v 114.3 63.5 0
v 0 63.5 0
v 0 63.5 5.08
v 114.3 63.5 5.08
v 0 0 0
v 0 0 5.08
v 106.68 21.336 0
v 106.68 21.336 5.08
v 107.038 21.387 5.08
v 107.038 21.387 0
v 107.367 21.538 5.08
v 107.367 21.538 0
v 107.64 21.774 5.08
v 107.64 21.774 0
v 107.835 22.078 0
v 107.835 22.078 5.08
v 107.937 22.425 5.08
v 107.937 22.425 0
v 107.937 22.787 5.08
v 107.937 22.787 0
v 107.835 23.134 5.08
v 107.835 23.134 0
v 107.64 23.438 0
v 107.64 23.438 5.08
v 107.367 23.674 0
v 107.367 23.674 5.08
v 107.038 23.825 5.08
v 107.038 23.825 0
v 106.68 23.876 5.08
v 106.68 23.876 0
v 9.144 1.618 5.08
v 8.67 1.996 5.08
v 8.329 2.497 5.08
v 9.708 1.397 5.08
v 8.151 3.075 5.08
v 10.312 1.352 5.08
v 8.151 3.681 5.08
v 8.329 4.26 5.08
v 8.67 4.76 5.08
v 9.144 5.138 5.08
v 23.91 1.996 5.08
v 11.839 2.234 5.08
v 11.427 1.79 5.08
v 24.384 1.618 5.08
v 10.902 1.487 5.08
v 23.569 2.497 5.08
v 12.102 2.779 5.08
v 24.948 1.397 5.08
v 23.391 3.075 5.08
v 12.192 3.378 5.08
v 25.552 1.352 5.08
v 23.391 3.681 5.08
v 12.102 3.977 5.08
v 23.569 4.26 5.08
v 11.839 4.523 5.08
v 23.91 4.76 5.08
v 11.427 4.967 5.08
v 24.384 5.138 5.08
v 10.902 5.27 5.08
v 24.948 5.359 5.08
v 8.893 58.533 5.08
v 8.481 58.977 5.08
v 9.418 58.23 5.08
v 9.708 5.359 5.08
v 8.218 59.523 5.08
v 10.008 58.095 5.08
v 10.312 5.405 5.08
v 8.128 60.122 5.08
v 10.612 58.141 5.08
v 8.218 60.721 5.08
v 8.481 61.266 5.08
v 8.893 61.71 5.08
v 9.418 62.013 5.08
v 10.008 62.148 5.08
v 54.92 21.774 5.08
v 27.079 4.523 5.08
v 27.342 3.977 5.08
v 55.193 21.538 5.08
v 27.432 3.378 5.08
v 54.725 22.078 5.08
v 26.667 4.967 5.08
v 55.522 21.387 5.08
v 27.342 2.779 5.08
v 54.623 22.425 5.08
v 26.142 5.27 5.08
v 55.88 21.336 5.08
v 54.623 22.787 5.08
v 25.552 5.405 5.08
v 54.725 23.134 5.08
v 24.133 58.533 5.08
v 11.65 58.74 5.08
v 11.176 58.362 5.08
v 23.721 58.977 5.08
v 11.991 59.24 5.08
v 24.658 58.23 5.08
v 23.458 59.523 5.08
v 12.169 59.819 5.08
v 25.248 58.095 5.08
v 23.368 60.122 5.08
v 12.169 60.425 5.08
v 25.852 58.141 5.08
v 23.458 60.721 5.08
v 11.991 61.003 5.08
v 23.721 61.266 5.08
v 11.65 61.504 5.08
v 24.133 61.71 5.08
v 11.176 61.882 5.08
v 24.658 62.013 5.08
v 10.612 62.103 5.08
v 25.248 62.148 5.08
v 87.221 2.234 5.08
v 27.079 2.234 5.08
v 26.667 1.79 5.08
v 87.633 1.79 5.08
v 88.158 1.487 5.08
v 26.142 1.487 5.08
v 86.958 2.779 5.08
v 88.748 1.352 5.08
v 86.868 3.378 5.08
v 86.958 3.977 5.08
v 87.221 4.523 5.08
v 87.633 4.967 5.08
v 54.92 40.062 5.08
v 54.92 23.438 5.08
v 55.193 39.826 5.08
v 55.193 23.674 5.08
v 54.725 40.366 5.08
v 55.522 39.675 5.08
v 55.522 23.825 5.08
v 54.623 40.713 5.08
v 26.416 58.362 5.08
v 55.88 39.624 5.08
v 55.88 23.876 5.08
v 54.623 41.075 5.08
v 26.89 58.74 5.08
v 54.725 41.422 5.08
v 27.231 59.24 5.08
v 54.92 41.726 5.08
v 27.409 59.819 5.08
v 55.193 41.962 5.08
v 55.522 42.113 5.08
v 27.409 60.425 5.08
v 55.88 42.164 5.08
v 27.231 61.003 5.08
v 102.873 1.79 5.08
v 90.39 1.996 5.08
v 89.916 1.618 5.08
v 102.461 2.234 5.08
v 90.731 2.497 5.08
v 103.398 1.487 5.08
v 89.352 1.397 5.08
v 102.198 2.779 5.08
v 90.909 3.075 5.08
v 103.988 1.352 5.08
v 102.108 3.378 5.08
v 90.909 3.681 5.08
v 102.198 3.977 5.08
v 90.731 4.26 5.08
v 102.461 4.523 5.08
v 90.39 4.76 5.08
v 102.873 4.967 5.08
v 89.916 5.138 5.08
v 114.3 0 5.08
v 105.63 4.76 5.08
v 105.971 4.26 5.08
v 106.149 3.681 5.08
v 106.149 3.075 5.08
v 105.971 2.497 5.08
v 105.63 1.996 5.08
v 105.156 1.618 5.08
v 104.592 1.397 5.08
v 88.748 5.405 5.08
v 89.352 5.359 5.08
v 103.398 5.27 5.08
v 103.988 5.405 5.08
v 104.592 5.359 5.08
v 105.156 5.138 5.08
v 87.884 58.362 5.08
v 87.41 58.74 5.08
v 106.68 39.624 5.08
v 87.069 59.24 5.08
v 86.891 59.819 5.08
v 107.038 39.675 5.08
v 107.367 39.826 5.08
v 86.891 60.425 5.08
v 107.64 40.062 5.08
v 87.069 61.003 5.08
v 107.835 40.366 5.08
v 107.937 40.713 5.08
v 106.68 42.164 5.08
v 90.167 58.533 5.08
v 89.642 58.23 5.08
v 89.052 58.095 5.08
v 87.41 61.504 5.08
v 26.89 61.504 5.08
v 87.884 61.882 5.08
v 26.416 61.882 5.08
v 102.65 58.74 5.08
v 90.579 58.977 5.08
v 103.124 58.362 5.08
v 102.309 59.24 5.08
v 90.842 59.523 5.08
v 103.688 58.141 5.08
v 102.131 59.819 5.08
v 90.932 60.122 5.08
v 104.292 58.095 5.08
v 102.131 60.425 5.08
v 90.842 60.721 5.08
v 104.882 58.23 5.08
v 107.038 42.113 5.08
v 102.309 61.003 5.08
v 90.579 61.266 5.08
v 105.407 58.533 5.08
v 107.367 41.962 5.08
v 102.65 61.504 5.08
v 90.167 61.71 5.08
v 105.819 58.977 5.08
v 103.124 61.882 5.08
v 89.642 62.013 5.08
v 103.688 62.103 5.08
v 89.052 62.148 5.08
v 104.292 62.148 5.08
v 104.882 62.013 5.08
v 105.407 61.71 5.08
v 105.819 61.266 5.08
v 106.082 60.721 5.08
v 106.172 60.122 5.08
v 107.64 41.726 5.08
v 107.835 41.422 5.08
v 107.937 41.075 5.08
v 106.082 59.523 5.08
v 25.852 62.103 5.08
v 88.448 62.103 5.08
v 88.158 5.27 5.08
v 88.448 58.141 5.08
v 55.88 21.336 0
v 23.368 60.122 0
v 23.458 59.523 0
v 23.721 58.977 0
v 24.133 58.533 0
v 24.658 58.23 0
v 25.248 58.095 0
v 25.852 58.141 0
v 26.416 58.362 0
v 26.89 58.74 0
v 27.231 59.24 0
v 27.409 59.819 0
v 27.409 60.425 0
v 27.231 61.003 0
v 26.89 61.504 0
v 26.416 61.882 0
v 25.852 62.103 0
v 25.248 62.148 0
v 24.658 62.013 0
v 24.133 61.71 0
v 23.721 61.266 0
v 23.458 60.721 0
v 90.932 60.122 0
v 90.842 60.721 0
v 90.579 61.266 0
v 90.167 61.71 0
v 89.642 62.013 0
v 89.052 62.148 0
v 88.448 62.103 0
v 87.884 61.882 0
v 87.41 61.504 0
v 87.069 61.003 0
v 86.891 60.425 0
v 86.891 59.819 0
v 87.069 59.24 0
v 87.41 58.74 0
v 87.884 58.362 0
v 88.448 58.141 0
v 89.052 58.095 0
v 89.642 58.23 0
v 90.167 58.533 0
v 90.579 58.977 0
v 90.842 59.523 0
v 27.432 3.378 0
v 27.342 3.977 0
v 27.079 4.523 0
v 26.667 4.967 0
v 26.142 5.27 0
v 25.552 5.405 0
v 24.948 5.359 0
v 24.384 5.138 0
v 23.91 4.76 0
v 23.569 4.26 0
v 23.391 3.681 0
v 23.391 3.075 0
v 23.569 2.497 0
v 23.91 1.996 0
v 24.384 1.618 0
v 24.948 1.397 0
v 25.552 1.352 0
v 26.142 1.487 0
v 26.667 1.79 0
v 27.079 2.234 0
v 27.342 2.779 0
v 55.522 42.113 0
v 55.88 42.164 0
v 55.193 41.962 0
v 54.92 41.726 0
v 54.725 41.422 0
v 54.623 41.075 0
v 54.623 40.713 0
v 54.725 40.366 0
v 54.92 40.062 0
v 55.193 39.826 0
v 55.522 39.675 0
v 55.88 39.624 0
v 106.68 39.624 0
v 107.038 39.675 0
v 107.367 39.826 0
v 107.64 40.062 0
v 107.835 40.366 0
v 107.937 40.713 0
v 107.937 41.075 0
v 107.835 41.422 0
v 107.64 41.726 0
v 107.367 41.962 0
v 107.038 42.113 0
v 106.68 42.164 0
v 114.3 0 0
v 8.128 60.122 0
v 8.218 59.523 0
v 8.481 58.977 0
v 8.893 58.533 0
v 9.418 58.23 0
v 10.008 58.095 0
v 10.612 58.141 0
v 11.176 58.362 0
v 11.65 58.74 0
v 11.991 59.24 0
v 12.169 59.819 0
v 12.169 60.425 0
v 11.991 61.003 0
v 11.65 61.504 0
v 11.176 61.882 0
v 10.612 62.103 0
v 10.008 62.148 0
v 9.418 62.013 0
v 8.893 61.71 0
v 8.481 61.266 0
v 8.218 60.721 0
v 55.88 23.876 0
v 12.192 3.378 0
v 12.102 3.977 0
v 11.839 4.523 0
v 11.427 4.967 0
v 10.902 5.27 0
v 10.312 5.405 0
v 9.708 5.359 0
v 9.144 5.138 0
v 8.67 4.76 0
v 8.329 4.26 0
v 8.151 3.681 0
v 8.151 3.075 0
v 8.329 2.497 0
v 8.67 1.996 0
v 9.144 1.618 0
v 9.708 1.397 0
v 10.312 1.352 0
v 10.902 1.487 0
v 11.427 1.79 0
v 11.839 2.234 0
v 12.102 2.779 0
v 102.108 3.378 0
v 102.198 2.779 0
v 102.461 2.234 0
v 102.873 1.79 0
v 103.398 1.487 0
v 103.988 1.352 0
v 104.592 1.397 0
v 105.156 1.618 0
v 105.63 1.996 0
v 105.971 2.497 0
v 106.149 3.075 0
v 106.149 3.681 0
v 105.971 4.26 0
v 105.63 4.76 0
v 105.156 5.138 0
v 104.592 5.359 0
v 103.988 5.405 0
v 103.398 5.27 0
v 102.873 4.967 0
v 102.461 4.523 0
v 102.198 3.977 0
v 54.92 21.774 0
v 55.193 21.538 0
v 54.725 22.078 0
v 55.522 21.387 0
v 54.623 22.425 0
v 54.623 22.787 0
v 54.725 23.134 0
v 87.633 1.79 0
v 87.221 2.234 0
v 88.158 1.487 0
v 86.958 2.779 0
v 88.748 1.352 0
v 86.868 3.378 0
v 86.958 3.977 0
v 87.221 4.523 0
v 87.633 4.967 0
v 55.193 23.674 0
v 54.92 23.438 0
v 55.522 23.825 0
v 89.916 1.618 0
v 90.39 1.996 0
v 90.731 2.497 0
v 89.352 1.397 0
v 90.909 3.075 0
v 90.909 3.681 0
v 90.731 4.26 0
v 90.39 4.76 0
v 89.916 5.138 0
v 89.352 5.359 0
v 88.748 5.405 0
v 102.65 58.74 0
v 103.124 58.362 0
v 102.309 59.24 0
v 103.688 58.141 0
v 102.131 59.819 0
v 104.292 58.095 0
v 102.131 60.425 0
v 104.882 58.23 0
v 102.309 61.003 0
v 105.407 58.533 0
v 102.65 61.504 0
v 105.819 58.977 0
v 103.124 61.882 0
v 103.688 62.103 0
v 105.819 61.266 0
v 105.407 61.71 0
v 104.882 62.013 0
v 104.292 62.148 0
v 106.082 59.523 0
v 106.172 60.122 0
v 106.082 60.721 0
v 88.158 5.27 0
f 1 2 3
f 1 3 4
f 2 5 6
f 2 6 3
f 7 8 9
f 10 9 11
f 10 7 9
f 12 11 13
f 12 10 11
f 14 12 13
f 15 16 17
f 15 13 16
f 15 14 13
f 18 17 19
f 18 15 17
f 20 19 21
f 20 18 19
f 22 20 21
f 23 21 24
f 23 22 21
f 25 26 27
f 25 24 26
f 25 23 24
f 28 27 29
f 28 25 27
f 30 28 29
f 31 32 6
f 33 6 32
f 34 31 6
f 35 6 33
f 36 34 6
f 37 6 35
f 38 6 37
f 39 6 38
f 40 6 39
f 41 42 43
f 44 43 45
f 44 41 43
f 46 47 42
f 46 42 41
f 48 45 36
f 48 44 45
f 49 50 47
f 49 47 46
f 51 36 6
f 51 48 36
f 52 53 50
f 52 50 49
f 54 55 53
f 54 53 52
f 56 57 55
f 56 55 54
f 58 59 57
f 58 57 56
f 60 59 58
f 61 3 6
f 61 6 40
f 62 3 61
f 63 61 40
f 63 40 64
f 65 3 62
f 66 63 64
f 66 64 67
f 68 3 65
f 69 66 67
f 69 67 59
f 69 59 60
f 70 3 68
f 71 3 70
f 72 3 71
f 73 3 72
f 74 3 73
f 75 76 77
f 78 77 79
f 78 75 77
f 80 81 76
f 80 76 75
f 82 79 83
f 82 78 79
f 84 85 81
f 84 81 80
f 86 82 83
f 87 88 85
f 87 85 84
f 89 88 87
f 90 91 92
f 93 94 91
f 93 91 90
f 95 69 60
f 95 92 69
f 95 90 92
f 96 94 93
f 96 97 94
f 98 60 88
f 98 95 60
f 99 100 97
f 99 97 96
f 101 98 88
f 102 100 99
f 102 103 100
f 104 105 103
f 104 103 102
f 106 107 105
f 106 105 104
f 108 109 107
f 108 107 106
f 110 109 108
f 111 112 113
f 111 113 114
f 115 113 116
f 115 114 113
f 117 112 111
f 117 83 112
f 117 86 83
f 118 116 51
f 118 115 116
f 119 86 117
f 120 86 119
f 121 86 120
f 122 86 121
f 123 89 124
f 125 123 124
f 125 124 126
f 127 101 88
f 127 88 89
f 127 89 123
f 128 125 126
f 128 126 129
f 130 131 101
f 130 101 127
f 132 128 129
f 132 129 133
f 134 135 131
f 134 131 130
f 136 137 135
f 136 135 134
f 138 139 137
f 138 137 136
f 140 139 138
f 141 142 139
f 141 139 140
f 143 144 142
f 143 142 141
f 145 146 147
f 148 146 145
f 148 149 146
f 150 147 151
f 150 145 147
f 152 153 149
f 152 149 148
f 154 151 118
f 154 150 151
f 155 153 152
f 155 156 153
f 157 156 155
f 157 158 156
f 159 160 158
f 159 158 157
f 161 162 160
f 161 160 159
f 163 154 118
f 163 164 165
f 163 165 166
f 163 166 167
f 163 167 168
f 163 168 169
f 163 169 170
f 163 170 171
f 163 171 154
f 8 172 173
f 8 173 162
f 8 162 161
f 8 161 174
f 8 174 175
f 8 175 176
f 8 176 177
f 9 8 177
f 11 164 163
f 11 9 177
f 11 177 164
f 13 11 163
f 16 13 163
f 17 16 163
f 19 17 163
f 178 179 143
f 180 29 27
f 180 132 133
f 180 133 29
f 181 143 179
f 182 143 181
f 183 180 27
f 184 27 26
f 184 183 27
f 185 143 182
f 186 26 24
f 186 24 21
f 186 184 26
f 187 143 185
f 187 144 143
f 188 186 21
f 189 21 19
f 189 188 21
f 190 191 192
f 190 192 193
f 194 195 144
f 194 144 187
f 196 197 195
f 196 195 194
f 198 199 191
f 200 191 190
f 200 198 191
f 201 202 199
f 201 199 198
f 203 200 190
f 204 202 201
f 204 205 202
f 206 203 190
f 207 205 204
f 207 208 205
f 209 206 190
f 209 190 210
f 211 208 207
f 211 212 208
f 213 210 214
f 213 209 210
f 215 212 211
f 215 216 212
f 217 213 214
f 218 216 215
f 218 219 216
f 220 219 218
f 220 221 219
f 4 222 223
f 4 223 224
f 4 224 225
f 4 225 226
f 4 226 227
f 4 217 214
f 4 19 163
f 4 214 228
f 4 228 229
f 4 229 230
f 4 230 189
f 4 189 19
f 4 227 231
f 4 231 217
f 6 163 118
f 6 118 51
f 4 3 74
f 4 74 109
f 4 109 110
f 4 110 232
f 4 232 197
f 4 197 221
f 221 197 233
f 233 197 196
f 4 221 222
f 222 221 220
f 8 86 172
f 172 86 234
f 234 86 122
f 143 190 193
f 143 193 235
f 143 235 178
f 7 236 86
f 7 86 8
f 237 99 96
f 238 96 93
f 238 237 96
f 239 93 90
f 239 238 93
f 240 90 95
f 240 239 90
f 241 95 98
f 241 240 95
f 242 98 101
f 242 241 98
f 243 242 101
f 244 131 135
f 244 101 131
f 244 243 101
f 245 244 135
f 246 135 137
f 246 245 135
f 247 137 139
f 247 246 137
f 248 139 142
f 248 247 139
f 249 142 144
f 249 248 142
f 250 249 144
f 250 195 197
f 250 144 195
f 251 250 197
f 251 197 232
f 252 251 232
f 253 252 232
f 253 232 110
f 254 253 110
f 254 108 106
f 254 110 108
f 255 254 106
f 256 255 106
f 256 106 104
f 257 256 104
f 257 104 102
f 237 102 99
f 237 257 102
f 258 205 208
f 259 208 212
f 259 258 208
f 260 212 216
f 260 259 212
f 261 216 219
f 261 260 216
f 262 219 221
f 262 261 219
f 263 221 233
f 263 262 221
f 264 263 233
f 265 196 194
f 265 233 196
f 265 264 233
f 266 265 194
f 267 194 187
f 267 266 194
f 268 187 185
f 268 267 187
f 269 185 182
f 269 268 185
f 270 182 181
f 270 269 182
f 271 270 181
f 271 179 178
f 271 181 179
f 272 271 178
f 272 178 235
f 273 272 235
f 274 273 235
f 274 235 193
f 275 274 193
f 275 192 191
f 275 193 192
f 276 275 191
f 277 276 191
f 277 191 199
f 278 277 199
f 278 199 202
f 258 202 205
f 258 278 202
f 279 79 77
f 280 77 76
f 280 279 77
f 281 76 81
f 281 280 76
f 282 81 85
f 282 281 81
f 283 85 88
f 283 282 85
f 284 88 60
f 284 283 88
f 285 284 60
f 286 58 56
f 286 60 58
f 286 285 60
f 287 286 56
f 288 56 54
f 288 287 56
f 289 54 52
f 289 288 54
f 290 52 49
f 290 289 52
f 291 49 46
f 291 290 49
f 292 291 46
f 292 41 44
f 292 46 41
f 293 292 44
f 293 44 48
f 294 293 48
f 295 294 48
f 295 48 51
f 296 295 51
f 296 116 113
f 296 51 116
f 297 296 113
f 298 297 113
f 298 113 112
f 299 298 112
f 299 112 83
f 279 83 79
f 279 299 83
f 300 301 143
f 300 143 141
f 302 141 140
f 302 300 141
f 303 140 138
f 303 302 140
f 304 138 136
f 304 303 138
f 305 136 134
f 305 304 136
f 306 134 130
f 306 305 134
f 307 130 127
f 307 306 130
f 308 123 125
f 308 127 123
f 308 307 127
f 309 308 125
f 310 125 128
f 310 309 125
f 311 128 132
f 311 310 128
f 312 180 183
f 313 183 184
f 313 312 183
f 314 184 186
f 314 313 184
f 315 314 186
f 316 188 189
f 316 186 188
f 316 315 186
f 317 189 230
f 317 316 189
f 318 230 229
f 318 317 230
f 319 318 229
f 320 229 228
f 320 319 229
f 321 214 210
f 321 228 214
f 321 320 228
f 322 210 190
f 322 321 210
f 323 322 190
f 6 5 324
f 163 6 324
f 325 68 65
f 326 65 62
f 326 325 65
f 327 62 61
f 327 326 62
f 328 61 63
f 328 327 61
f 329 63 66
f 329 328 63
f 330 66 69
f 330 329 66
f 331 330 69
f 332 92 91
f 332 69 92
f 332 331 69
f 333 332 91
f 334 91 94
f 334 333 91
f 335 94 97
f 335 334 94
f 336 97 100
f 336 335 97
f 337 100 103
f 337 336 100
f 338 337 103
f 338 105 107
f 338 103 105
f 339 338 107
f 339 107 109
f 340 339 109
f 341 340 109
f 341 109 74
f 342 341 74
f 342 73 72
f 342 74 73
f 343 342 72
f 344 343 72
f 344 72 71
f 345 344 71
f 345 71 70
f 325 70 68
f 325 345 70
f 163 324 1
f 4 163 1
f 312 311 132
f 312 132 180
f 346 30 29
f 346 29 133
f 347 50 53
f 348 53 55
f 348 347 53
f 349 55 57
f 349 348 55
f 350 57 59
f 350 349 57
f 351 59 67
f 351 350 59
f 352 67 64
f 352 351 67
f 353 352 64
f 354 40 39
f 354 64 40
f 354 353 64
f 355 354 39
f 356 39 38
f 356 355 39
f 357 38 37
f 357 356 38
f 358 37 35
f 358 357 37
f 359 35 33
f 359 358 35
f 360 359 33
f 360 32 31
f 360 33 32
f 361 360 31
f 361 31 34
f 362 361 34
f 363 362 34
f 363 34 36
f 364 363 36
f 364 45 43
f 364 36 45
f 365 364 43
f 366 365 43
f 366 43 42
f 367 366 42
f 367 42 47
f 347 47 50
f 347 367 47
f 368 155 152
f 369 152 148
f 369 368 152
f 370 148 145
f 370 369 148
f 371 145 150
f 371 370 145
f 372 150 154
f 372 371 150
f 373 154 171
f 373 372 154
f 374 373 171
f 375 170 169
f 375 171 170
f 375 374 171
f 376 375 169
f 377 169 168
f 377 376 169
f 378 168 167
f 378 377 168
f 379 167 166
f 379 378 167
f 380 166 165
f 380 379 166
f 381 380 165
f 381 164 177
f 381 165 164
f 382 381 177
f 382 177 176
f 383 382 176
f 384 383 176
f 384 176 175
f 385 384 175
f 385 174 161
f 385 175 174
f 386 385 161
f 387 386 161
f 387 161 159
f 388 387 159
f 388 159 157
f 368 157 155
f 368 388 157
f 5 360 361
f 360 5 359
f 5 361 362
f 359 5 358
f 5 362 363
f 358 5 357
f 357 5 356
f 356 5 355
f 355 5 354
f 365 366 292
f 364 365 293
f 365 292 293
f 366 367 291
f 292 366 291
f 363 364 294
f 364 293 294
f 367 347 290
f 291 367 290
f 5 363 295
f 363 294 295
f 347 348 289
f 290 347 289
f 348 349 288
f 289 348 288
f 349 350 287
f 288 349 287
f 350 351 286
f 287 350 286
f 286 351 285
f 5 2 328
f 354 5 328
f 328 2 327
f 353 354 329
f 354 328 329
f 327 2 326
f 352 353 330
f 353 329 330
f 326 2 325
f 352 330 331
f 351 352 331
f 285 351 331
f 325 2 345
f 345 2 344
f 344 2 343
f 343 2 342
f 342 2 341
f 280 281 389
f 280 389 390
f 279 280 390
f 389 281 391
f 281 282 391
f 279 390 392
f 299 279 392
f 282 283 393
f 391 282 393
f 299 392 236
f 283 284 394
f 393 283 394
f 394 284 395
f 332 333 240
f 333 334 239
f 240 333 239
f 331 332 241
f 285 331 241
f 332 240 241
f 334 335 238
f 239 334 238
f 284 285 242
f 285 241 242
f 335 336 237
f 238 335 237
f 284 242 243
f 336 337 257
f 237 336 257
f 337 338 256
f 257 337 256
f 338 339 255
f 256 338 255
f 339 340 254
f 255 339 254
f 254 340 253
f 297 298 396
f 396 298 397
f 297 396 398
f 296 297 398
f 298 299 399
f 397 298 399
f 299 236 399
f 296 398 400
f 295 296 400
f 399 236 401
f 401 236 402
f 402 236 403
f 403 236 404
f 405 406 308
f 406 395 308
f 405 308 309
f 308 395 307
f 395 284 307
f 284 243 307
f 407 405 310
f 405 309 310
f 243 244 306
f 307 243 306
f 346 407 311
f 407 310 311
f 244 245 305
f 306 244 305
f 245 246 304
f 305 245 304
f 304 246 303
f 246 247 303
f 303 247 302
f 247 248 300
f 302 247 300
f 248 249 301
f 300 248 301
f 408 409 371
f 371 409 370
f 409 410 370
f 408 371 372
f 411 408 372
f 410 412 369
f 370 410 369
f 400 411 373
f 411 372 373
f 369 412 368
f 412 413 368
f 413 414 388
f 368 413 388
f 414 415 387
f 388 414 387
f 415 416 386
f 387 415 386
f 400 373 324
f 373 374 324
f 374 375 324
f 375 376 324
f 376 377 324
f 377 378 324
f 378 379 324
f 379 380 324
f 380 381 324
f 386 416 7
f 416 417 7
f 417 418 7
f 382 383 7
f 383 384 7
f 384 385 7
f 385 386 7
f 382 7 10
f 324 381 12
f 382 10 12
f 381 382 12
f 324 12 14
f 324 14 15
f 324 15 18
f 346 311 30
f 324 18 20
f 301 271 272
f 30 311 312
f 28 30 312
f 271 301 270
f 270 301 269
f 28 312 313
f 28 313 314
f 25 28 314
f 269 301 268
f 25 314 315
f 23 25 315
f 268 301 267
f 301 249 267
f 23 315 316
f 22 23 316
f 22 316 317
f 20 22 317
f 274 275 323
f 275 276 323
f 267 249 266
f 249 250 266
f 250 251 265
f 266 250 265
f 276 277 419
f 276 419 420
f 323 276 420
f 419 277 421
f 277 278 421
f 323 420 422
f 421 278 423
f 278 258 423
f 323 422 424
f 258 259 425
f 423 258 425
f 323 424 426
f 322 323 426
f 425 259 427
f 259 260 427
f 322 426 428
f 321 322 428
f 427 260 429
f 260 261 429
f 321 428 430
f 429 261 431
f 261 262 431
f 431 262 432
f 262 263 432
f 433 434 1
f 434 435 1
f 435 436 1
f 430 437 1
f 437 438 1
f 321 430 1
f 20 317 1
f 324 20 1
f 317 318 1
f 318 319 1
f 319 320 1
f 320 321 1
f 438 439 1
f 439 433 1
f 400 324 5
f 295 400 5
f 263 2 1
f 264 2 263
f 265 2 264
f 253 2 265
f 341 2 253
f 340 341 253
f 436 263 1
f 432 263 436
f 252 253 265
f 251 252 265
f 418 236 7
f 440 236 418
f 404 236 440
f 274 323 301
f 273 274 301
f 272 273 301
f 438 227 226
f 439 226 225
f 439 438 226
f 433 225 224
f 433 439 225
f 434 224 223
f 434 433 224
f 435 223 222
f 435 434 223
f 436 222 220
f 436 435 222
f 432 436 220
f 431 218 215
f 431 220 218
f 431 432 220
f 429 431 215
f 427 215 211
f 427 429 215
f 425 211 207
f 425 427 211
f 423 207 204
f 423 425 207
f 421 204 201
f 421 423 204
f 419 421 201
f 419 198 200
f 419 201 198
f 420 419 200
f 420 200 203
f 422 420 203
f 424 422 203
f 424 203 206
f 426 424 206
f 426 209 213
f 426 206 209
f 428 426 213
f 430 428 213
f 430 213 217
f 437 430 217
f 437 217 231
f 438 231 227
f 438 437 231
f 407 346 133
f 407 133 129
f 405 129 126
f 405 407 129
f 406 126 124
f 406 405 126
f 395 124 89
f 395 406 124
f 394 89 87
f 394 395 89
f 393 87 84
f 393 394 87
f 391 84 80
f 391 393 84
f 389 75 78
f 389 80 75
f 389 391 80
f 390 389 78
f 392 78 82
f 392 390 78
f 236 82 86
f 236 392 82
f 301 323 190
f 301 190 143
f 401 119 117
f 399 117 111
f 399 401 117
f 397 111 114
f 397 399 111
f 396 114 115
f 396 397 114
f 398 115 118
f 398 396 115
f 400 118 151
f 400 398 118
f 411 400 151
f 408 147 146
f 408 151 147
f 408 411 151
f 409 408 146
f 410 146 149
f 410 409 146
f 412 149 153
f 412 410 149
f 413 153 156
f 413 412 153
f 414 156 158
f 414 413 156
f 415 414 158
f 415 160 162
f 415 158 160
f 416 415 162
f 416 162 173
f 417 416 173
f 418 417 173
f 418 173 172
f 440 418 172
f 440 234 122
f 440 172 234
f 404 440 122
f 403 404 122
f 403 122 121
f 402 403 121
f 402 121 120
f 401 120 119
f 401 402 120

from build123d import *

# Parameters (mm, degrees)
SKETCH1_W           = 114.3
SKETCH1_H           = 63.5
BOSS_EXTRUDE3_DEPTH = 5.08
SKETCH2_R           = 2.032
CUT_EXTRUDE4_DEPTH  = 131.853148223
CUT_EXTRUDE5_DEPTH  = 131.853148223


with BuildPart() as part:
    # Sketch1 → Boss-Extrude3 (new body)
    with BuildSketch(Plane.XY):
        with Locations((57.15, 31.75)):
            Rectangle(SKETCH1_W, SKETCH1_H)
    extrude(amount=BOSS_EXTRUDE3_DEPTH)

    # Sketch2 → Cut-Extrude4 (cut, through all)
    with BuildSketch(Plane.XY):
        with Locations((88.9, 60.1218)):
            Circle(SKETCH2_R)
        with Locations(Location((88.9, 3.3782, 0), (0, 0, 180))):
            Circle(SKETCH2_R)
        with Locations((25.4, 3.3782)):
            Circle(SKETCH2_R)
        with Locations(Location((25.4, 60.1218, 0), (0, 0, 180))):
            Circle(SKETCH2_R)
        with Locations((10.16, 3.3782)):
            Circle(SKETCH2_R)
        with Locations(Location((10.16, 60.1218, 0), (0, 0, 180))):
            Circle(SKETCH2_R)
        with Locations(Location((104.14, 3.3782, 0), (0, 0, 180))):
            Circle(SKETCH2_R)
        with Locations((104.14, 60.1218)):
            Circle(SKETCH2_R)
    extrude(amount=CUT_EXTRUDE4_DEPTH, mode=Mode.SUBTRACT)

    # Sketch3 → Cut-Extrude5 (cut, through all)
    with BuildSketch(Plane(origin=(0, 0, 0), x_dir=(-1, 0, 0), z_dir=(0, 0, -1))):
        with BuildLine():
            Line((-106.68, 42.164), (-55.88, 42.164))
            ThreePointArc((-55.88, 42.164), (-54.61, 40.894), (-55.88, 39.624))
            Line((-55.88, 39.624), (-106.68, 39.624))
            ThreePointArc((-106.68, 39.624), (-107.95, 40.894), (-106.68, 42.164))
        make_face()
        with BuildLine():
            Line((-106.68, 23.876), (-55.88, 23.876))
            ThreePointArc((-55.88, 23.876), (-54.61, 22.606), (-55.88, 21.336))
            Line((-55.88, 21.336), (-106.68, 21.336))
            ThreePointArc((-106.68, 21.336), (-107.95, 22.606), (-106.68, 23.876))
        make_face()
    extrude(amount=-CUT_EXTRUDE5_DEPTH, mode=Mode.SUBTRACT)


solid = part.part
